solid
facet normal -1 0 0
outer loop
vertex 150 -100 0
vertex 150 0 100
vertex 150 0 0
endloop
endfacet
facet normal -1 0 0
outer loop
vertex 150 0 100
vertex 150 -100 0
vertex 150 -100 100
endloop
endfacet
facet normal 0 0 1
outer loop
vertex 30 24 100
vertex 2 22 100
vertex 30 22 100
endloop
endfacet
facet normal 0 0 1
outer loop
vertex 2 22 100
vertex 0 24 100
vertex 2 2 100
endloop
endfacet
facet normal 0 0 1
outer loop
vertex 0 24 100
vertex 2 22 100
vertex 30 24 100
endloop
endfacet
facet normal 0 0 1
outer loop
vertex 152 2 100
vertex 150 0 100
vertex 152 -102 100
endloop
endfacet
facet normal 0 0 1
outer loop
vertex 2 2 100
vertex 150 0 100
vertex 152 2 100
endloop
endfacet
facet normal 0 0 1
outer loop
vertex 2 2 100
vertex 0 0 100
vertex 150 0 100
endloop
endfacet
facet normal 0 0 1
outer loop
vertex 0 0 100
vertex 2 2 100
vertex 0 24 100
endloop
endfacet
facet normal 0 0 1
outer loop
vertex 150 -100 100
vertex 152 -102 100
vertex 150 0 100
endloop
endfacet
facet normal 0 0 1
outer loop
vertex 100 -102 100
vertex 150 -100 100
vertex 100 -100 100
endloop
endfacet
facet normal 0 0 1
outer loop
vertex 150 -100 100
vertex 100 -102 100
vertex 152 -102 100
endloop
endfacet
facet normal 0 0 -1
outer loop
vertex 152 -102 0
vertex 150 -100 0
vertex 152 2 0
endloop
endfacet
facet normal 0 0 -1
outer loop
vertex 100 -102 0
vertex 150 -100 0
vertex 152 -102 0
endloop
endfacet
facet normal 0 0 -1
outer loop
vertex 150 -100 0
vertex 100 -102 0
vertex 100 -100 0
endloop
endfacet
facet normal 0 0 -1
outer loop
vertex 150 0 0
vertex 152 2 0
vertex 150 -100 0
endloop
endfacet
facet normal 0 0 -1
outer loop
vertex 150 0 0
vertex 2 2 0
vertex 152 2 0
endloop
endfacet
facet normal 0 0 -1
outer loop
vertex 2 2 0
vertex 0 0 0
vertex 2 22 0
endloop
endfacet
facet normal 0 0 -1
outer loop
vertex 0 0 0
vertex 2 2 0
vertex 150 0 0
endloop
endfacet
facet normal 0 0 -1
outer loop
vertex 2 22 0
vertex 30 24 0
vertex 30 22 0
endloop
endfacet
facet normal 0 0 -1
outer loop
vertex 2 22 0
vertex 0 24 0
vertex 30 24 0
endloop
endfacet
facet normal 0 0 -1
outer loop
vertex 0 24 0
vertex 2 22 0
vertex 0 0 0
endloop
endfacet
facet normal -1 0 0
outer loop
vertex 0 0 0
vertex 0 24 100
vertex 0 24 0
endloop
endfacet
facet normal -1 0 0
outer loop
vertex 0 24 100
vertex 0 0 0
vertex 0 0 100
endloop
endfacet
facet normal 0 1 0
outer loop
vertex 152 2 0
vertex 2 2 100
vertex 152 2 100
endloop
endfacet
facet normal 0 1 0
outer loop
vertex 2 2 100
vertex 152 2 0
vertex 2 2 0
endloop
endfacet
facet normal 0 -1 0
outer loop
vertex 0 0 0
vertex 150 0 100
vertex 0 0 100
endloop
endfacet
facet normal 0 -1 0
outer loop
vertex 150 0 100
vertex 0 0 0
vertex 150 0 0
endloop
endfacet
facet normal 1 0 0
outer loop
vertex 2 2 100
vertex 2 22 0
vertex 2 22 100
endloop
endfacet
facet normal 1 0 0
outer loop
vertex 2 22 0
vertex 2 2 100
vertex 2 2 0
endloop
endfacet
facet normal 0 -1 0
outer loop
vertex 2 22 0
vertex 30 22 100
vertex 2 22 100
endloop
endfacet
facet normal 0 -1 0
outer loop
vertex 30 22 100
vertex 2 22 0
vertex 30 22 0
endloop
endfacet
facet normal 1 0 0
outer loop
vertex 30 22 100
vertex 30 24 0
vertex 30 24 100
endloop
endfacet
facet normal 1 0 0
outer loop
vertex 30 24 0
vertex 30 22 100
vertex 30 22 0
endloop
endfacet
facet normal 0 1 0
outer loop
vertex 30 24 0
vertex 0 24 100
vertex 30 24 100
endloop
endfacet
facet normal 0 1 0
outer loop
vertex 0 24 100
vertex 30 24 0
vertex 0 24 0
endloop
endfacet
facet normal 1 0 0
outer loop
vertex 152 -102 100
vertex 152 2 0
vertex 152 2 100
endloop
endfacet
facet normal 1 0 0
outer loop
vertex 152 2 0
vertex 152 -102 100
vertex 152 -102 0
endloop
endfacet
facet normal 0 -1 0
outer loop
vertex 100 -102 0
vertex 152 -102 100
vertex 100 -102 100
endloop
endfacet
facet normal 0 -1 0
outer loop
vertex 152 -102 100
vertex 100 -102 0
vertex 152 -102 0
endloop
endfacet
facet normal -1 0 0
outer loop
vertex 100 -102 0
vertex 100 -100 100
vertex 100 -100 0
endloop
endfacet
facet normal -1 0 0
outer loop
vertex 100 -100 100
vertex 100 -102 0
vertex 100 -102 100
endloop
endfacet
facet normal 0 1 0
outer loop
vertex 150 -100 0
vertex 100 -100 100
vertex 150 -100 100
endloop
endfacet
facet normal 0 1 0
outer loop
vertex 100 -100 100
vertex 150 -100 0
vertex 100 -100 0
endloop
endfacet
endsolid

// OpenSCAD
thickness = 2;
extruded_length = 100;
hook_opening = 20;
hook_length = 30;
shelf_opening = 100;
shelf_lip_length = 50;
hanging_height = 150;

cube([hanging_height, thickness, extruded_length]);
cube([thickness, (hook_opening + thickness), extruded_length]);
translate([0, hook_opening + thickness, 0]) cube([hook_length, thickness, extruded_length]);
translate([hanging_height, -shelf_opening-thickness, 0]) cube([thickness, shelf_opening + 2*thickness, extruded_length]);
translate([hanging_height-shelf_lip_length, -shelf_opening-thickness, 0]) cube([shelf_lip_length, thickness, extruded_length]);
